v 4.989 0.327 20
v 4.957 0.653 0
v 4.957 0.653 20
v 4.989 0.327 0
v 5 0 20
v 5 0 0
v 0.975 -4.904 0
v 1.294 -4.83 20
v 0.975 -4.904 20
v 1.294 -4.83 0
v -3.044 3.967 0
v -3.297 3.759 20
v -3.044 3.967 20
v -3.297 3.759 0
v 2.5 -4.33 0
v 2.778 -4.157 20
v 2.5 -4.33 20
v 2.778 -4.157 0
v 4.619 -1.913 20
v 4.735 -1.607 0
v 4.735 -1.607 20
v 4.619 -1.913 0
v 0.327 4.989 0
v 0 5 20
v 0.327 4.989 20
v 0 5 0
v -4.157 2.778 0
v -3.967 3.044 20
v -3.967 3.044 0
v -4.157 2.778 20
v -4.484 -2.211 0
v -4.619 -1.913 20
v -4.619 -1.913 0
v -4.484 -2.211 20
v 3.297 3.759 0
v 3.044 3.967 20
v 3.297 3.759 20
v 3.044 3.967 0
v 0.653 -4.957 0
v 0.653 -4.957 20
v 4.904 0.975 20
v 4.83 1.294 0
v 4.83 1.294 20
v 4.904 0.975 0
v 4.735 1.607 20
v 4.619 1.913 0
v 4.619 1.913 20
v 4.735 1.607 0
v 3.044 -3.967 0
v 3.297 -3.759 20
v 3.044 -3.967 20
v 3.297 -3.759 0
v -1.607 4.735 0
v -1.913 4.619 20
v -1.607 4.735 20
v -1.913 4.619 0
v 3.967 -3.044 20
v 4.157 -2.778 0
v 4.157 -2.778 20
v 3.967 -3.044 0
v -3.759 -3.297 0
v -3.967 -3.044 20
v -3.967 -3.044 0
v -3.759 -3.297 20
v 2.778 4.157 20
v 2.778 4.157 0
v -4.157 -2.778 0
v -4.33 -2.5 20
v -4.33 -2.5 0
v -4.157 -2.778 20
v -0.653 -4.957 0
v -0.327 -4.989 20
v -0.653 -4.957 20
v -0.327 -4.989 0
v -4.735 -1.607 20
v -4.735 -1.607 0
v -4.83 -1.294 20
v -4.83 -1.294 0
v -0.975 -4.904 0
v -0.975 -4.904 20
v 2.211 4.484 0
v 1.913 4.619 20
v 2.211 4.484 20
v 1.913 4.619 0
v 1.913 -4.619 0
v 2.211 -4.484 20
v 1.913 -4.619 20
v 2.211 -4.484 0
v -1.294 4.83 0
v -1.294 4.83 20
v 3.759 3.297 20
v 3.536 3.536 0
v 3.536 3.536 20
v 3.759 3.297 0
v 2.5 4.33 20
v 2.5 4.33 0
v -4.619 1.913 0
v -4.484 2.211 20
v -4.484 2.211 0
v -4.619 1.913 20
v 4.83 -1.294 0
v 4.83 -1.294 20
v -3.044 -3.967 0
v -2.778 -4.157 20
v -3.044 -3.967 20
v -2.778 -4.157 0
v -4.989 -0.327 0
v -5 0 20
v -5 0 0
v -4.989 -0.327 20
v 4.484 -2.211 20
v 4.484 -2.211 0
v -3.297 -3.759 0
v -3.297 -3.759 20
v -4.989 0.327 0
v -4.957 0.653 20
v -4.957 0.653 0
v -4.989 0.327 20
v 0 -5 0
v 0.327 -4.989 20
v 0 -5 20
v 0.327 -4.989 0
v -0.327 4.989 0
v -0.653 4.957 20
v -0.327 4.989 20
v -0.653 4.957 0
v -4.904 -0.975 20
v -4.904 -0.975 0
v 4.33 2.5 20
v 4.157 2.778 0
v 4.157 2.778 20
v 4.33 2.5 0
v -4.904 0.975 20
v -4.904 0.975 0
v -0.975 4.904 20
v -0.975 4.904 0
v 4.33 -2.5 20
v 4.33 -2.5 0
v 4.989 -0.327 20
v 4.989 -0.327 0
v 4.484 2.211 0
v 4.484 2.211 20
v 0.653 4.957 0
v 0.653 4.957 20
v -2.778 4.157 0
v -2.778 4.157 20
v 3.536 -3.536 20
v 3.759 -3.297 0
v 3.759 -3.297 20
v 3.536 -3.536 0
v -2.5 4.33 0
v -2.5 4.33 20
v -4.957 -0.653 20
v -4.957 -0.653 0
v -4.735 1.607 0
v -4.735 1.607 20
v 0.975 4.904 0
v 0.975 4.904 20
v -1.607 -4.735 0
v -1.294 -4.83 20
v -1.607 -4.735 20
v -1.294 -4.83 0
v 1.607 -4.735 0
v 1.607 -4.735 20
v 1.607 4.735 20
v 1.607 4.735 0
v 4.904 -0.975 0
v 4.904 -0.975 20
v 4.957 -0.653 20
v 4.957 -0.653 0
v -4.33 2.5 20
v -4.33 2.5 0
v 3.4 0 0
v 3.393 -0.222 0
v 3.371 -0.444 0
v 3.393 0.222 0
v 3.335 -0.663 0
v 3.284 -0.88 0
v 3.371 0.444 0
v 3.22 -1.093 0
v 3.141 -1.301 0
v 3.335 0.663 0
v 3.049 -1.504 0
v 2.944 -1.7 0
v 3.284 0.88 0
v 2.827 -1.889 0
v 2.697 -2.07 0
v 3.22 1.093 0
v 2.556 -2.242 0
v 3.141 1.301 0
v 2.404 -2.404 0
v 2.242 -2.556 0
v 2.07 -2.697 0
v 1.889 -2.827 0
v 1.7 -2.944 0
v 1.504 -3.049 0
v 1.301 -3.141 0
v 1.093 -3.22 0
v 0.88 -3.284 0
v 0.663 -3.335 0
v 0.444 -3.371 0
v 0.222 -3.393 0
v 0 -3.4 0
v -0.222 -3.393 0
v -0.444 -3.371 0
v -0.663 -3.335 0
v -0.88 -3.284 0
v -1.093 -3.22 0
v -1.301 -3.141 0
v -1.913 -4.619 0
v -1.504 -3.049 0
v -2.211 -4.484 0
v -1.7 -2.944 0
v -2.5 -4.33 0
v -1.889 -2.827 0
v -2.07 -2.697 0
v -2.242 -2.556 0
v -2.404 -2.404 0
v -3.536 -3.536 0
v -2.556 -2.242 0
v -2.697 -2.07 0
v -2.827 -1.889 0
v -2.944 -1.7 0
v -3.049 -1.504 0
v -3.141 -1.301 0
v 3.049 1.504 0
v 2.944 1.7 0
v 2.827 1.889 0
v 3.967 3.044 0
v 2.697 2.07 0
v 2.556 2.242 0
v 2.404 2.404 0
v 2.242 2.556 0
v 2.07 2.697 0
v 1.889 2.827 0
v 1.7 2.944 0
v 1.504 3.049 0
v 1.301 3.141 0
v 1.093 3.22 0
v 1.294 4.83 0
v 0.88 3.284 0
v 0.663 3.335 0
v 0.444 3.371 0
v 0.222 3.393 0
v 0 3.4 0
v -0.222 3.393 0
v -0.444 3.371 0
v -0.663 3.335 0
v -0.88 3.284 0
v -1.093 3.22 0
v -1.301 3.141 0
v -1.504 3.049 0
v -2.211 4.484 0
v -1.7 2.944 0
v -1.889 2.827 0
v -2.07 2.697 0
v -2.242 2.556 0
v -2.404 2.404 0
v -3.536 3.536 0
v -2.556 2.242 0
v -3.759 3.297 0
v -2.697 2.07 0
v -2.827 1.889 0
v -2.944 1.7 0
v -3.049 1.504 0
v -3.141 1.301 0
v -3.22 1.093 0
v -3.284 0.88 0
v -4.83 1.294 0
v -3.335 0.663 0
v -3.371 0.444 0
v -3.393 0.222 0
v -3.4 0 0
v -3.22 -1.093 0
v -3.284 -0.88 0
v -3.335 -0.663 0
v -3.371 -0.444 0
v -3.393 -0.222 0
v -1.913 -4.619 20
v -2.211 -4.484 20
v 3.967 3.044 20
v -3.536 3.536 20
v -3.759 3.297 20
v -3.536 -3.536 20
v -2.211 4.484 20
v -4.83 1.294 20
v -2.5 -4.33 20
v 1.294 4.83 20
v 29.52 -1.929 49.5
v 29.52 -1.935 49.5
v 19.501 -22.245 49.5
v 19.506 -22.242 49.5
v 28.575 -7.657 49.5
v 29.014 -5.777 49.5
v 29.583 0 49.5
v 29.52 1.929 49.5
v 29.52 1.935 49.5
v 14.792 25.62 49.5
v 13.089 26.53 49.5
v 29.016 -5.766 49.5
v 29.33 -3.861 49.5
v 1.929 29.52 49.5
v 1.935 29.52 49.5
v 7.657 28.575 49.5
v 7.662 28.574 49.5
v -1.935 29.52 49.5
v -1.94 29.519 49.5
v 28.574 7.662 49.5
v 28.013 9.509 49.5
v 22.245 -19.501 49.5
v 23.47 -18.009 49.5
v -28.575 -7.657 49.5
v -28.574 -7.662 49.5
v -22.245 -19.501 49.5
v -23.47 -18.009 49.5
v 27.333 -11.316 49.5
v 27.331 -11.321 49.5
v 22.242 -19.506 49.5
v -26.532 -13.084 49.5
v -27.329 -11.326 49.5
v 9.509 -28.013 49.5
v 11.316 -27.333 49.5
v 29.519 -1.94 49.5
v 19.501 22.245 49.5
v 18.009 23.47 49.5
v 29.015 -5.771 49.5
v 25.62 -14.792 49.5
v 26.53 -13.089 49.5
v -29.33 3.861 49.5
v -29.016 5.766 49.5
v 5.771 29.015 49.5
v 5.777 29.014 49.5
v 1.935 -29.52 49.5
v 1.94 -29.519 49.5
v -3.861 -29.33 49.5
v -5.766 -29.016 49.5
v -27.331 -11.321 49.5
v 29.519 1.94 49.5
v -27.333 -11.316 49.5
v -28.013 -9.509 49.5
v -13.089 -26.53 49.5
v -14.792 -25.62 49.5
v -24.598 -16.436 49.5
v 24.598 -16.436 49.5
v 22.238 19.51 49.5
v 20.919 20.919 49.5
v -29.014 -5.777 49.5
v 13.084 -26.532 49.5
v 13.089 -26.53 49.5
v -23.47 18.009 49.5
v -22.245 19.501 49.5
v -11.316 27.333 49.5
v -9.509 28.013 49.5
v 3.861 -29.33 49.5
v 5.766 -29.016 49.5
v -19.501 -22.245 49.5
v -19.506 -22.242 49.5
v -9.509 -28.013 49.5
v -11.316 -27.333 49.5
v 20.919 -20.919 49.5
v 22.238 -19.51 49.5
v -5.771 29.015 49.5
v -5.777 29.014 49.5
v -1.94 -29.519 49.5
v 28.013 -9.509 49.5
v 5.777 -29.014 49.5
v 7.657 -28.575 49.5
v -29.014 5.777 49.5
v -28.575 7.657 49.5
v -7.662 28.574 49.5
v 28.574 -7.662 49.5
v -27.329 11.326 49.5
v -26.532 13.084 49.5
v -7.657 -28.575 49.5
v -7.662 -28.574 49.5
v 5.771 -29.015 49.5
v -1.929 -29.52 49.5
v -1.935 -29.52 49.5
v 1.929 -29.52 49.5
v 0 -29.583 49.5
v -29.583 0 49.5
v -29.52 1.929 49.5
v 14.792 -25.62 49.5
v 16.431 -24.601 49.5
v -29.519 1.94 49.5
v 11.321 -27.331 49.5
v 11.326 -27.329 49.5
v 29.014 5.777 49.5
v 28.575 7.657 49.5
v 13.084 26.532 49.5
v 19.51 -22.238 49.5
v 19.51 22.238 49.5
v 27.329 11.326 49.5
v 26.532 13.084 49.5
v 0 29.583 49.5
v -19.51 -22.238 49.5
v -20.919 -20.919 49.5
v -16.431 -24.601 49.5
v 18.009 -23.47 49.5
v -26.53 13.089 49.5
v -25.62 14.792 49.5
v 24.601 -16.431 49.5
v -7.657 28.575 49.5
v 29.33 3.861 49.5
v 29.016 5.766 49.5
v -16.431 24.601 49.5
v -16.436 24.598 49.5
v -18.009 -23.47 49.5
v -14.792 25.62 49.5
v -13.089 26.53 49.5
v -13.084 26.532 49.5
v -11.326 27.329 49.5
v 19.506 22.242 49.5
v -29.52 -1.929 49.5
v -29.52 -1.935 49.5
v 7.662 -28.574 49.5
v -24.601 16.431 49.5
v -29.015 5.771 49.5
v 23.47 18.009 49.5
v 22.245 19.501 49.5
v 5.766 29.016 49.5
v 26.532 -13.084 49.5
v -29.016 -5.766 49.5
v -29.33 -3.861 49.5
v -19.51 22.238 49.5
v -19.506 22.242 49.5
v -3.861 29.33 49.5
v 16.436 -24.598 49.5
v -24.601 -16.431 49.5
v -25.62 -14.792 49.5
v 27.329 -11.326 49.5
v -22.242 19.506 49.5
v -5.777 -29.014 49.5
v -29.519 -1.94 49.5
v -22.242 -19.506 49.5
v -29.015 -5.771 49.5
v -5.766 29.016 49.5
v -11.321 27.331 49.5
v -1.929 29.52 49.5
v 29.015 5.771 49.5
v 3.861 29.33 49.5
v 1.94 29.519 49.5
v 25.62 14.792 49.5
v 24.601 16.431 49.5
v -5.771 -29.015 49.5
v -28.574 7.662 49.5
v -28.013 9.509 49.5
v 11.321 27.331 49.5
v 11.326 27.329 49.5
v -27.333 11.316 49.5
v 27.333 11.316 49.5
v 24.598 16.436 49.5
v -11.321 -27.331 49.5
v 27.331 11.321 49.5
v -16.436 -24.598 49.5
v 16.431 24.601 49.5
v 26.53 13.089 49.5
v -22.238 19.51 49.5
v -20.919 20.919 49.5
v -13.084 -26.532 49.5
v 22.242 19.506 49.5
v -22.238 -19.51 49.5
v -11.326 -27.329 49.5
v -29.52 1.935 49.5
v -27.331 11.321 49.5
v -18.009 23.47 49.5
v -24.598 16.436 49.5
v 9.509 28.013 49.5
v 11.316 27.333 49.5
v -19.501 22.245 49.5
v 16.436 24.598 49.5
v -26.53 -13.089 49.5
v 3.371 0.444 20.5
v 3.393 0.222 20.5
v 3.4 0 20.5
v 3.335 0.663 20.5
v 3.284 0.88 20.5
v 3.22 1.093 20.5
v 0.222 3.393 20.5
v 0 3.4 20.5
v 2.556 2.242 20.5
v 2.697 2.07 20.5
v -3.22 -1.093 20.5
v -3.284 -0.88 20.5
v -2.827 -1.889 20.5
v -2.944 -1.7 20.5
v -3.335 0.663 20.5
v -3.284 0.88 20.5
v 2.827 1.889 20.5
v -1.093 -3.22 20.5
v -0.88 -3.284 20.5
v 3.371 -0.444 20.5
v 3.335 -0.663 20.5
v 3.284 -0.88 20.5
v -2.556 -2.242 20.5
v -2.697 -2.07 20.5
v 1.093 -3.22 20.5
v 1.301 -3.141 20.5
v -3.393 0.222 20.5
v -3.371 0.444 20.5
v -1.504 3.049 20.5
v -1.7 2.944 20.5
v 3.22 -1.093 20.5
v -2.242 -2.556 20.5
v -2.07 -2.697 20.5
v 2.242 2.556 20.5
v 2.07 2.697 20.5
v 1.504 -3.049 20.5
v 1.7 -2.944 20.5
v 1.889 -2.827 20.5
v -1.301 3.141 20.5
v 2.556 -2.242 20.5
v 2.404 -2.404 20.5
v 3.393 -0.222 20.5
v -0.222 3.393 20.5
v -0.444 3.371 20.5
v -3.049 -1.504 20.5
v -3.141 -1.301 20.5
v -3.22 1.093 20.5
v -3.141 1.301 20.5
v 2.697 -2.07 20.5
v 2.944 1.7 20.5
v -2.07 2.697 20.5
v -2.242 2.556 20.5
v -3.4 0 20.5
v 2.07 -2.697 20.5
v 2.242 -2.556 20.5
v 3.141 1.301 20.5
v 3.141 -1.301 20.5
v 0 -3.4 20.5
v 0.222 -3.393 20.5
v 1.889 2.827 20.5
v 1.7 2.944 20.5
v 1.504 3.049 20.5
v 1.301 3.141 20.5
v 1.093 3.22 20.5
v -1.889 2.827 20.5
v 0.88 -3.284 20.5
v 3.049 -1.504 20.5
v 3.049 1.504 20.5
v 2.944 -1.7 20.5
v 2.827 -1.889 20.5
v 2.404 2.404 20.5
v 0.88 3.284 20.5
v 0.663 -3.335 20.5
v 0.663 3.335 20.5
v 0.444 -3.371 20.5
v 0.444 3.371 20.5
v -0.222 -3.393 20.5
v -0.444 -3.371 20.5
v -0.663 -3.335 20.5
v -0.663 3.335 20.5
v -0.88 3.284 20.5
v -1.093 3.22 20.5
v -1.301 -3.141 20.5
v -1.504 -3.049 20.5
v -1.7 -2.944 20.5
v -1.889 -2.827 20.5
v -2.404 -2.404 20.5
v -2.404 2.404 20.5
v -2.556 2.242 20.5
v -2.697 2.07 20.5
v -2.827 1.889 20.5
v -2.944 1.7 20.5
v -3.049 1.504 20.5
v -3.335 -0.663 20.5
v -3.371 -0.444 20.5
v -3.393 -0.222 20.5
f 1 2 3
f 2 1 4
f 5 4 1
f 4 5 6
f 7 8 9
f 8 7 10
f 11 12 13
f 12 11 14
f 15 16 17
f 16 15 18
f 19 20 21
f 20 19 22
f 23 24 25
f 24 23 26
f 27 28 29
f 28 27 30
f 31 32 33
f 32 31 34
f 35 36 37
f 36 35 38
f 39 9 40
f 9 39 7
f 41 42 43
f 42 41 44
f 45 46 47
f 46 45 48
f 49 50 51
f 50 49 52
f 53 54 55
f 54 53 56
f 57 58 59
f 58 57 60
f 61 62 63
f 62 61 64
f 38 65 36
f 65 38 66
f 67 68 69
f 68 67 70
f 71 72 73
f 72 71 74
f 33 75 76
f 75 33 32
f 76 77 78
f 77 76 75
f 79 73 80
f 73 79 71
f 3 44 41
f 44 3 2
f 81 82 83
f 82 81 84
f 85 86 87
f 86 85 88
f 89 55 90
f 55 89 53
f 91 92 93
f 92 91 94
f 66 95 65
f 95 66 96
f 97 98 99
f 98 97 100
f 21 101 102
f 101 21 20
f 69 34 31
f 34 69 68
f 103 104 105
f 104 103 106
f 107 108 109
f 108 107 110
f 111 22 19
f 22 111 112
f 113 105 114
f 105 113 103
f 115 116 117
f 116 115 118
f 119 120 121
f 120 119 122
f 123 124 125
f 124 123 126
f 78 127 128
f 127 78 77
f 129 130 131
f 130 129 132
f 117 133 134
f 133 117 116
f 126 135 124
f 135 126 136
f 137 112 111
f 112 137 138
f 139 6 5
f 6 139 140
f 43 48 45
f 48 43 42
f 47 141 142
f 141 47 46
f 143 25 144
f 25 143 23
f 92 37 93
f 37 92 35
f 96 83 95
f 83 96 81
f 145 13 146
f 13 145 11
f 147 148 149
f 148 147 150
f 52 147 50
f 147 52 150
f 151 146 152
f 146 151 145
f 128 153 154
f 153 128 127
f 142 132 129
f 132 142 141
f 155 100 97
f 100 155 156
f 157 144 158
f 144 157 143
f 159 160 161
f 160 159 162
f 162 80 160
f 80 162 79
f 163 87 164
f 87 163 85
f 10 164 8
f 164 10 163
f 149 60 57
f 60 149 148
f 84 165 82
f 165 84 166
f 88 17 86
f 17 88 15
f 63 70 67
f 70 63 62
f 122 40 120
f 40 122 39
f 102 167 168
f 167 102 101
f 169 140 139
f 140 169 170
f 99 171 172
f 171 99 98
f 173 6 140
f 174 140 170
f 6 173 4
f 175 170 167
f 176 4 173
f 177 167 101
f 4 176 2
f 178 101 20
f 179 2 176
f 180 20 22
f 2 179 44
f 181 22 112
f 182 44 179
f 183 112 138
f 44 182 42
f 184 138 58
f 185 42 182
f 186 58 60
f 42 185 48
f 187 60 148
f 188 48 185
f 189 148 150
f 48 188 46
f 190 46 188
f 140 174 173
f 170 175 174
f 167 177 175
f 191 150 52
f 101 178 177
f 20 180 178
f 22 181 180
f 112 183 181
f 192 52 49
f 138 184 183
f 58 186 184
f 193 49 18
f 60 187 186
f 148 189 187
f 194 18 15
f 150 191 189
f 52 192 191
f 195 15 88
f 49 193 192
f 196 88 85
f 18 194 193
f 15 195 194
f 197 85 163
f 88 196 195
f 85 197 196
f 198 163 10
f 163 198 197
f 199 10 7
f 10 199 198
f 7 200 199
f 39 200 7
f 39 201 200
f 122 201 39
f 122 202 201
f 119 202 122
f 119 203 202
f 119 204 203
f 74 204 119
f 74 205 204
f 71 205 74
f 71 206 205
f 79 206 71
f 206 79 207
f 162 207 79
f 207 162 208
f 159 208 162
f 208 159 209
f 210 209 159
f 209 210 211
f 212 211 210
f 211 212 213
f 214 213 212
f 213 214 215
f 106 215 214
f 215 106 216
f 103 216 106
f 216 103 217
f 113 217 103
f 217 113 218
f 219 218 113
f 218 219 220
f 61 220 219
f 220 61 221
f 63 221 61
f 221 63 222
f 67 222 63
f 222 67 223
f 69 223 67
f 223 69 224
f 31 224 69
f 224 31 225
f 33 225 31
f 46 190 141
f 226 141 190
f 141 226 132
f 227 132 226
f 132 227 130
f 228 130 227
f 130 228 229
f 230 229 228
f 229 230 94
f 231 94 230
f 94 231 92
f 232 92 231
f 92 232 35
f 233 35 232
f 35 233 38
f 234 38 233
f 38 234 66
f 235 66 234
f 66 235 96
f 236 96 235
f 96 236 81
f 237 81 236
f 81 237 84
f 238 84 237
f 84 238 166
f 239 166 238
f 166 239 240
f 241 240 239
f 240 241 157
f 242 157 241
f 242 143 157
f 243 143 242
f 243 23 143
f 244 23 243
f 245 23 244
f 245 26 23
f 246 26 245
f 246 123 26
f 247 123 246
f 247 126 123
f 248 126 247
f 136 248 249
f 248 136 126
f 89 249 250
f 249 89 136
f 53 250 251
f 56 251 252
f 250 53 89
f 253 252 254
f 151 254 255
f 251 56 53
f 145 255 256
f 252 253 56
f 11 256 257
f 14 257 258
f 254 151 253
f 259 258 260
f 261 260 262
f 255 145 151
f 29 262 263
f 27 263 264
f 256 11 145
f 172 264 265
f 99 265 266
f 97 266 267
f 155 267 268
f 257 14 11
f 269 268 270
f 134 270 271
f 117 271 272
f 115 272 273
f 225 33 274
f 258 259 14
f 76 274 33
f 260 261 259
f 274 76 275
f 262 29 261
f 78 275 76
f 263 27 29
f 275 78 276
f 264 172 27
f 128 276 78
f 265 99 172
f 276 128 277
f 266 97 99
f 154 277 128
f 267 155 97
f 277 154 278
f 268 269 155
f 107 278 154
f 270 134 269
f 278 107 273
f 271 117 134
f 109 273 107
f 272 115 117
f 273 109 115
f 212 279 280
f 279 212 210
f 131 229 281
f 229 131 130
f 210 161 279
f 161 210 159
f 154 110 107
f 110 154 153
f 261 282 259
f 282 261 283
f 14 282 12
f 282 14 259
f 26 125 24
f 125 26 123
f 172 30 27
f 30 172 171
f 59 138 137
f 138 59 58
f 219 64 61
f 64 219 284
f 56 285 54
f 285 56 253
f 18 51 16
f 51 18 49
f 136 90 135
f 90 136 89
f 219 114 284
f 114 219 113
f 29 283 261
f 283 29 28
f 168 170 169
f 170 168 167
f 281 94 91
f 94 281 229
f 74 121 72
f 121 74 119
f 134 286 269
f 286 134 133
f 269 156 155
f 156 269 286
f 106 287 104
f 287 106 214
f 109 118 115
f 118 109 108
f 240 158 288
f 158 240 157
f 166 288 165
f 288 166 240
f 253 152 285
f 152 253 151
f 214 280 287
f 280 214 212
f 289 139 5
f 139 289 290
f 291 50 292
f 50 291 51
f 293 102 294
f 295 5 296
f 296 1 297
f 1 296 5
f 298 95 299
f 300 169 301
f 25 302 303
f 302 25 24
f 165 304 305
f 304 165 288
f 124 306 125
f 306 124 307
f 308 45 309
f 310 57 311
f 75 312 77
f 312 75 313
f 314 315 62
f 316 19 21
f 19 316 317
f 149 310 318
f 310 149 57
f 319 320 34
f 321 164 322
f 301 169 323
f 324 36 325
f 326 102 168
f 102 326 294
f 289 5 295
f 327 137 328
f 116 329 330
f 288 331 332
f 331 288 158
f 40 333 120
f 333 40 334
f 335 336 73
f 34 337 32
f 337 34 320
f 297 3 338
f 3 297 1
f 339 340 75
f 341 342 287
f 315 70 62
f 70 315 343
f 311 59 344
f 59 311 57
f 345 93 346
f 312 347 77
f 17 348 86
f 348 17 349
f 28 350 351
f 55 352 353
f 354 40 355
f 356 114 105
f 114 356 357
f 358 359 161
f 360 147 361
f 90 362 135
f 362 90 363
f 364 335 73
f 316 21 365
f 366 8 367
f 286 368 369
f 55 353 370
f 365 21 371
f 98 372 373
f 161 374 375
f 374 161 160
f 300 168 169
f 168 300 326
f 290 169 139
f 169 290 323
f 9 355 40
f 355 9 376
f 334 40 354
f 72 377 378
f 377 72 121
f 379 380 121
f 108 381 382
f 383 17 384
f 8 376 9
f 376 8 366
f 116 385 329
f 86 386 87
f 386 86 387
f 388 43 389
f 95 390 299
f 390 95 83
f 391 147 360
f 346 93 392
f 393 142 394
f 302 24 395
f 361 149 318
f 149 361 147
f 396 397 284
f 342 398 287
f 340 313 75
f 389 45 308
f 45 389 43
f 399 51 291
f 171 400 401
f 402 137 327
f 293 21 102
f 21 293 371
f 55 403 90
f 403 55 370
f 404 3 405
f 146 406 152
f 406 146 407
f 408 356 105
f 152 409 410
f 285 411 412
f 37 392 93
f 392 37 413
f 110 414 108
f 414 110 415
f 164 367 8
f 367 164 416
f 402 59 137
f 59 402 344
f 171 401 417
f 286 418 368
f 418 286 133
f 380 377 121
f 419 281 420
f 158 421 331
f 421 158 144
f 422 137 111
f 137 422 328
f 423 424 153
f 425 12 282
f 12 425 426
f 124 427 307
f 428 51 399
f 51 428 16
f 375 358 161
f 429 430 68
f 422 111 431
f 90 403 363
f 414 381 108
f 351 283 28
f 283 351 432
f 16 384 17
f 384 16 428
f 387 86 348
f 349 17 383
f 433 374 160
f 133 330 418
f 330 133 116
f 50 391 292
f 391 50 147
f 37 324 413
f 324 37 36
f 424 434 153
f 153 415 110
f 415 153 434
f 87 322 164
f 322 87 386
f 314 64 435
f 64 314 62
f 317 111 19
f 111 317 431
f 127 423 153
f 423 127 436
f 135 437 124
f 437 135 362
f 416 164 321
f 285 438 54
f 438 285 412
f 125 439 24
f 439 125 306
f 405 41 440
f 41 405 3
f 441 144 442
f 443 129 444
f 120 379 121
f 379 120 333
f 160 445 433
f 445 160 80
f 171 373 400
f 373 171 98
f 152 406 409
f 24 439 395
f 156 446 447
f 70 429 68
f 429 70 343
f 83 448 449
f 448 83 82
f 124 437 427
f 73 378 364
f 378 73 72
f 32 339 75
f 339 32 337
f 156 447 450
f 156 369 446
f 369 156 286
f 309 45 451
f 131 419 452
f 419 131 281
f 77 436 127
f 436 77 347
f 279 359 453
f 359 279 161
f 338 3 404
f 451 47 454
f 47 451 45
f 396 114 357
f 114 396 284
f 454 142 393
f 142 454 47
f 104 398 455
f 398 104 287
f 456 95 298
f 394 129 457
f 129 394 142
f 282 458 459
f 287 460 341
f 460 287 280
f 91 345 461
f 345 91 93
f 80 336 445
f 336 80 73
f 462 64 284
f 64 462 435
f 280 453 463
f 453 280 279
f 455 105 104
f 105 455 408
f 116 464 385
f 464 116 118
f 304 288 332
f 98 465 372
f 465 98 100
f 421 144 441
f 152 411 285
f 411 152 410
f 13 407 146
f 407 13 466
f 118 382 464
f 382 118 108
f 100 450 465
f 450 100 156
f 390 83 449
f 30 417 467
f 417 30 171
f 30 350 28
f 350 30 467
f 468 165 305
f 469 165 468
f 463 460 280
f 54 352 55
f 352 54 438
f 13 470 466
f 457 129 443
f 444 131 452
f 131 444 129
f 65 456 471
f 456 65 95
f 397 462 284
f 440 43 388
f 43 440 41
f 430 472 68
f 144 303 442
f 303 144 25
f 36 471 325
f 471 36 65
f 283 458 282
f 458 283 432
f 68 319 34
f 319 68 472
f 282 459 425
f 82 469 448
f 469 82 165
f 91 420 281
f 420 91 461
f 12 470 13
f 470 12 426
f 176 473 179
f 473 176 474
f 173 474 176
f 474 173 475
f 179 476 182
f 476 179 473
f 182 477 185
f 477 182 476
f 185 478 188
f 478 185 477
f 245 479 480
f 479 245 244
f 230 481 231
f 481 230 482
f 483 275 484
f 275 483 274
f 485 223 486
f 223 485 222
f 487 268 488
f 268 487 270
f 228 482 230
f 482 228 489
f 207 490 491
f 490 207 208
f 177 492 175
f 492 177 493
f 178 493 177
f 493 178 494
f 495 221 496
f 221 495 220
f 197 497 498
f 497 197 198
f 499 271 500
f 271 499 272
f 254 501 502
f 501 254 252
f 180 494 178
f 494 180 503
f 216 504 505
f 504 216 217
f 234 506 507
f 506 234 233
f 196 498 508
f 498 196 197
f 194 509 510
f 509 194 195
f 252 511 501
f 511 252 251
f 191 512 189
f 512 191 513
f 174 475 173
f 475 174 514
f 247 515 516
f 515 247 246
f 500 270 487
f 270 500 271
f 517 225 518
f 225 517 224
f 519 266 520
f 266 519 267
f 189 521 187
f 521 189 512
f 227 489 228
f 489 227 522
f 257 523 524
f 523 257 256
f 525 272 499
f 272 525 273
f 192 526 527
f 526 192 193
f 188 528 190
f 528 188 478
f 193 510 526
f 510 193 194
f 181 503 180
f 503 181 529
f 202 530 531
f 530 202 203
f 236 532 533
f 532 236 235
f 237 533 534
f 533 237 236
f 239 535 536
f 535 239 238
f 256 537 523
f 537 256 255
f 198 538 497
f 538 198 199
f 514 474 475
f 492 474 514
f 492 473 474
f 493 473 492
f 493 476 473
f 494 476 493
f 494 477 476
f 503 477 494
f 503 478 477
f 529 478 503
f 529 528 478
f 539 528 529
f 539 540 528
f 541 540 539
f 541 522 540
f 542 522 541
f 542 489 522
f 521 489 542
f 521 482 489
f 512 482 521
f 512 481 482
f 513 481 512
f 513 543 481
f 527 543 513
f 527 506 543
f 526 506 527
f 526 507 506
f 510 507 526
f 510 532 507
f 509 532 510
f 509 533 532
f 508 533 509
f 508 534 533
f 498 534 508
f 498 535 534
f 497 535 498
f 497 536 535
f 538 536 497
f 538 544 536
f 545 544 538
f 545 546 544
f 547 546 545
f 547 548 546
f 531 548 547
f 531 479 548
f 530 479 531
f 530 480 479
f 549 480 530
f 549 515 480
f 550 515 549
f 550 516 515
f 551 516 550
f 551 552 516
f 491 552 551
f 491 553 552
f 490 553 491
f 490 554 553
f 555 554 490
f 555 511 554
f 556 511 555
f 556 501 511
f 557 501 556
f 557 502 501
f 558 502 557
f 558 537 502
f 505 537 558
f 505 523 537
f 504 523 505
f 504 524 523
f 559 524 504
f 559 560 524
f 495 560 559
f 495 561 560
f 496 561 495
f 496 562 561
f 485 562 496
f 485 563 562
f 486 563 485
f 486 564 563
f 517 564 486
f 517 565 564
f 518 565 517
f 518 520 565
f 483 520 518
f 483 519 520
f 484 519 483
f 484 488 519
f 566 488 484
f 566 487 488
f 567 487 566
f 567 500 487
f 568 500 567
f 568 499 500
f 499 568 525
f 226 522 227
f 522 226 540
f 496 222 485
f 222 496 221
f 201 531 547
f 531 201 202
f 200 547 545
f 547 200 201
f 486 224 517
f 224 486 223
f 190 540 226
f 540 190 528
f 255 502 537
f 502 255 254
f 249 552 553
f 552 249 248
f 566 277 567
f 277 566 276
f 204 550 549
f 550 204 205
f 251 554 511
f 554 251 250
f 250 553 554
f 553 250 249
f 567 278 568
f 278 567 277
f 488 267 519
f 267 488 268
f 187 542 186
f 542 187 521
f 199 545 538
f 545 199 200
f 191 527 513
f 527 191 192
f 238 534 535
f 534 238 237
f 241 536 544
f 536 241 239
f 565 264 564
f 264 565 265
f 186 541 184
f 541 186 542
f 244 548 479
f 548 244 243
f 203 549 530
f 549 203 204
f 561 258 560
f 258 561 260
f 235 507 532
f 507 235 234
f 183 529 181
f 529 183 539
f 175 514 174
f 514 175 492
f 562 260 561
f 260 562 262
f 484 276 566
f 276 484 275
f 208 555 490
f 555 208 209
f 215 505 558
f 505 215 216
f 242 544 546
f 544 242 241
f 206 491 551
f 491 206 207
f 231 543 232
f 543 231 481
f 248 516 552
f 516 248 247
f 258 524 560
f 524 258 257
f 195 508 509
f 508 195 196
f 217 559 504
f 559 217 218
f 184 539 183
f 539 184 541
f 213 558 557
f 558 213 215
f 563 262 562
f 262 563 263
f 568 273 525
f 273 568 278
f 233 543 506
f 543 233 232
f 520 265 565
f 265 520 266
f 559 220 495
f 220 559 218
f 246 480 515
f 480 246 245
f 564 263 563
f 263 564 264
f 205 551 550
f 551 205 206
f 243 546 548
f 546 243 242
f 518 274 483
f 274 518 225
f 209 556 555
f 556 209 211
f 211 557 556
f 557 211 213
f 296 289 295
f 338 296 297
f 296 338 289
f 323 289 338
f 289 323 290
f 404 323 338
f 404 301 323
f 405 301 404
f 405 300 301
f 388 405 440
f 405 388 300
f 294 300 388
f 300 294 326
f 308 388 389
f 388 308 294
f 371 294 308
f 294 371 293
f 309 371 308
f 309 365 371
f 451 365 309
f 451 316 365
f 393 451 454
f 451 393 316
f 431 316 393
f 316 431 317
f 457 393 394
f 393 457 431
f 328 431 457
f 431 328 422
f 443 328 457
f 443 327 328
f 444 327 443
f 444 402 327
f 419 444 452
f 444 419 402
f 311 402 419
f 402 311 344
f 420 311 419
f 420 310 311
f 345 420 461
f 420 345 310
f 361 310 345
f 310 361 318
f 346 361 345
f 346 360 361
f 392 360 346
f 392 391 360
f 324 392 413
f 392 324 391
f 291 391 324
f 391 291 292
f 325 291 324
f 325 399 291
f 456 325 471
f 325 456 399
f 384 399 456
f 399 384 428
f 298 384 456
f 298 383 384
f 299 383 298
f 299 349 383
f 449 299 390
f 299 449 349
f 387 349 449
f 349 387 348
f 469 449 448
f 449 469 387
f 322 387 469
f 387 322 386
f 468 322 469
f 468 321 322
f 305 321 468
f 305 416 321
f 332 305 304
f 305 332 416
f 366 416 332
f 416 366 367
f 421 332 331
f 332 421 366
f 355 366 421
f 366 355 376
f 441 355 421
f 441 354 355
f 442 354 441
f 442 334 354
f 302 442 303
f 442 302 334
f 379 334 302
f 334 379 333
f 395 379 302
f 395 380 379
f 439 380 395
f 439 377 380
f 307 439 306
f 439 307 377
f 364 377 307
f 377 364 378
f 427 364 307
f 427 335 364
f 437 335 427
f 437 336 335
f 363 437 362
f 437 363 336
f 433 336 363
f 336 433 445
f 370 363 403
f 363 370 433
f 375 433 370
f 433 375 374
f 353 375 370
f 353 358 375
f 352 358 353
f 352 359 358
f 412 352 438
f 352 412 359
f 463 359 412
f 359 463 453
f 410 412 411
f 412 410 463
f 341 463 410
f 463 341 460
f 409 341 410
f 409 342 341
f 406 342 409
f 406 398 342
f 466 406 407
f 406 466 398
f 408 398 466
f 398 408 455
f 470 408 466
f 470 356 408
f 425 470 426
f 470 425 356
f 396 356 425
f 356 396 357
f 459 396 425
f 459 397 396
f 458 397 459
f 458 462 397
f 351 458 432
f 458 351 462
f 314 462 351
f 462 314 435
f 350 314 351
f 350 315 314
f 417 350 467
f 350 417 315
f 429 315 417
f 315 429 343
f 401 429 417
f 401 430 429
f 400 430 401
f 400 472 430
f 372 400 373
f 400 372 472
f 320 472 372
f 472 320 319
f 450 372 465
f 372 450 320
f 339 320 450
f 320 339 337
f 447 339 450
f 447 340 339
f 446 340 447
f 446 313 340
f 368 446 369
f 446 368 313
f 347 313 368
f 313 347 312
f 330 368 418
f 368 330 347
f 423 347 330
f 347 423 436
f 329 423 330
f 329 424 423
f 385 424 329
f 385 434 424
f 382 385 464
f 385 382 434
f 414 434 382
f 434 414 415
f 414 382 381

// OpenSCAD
// Lab funnel - printed upright, open at top and bottom
// Units: mm

$fn = 96;

// --- Dimensions ---
spout_od      = 10;    // spout outer diameter
spout_id      = spout_od - 2 * 1.6;  // spout bore (6.8 mm)
spout_h       = 20;    // spout height (z = 0 to 20)
cone_bottom_d = spout_od;  // cone starts at spout diameter
cone_top_d    = 60;    // cone rim diameter
cone_h        = 30;    // cone height (z = 20 to 50)
wall          = 1.6;   // uniform wall thickness
eps           = 0.5;   // cutter overshoot

difference() {
    union() {
        // Spout
        cylinder(d = spout_od, h = spout_h);
        // Cone
        translate([0, 0, spout_h])
            cylinder(d1 = cone_bottom_d, d2 = cone_top_d, h = cone_h);
    }
    // Bottom cutter (through bore)
    translate([0, 0, -eps])
        cylinder(d = spout_id, h = spout_h + 2 * eps);
    // Top cutter (open rim)
    translate([0, 0, spout_h + cone_h - eps])
        cylinder(d = cone_top_d, h = cone_h + 2 * eps);
}
